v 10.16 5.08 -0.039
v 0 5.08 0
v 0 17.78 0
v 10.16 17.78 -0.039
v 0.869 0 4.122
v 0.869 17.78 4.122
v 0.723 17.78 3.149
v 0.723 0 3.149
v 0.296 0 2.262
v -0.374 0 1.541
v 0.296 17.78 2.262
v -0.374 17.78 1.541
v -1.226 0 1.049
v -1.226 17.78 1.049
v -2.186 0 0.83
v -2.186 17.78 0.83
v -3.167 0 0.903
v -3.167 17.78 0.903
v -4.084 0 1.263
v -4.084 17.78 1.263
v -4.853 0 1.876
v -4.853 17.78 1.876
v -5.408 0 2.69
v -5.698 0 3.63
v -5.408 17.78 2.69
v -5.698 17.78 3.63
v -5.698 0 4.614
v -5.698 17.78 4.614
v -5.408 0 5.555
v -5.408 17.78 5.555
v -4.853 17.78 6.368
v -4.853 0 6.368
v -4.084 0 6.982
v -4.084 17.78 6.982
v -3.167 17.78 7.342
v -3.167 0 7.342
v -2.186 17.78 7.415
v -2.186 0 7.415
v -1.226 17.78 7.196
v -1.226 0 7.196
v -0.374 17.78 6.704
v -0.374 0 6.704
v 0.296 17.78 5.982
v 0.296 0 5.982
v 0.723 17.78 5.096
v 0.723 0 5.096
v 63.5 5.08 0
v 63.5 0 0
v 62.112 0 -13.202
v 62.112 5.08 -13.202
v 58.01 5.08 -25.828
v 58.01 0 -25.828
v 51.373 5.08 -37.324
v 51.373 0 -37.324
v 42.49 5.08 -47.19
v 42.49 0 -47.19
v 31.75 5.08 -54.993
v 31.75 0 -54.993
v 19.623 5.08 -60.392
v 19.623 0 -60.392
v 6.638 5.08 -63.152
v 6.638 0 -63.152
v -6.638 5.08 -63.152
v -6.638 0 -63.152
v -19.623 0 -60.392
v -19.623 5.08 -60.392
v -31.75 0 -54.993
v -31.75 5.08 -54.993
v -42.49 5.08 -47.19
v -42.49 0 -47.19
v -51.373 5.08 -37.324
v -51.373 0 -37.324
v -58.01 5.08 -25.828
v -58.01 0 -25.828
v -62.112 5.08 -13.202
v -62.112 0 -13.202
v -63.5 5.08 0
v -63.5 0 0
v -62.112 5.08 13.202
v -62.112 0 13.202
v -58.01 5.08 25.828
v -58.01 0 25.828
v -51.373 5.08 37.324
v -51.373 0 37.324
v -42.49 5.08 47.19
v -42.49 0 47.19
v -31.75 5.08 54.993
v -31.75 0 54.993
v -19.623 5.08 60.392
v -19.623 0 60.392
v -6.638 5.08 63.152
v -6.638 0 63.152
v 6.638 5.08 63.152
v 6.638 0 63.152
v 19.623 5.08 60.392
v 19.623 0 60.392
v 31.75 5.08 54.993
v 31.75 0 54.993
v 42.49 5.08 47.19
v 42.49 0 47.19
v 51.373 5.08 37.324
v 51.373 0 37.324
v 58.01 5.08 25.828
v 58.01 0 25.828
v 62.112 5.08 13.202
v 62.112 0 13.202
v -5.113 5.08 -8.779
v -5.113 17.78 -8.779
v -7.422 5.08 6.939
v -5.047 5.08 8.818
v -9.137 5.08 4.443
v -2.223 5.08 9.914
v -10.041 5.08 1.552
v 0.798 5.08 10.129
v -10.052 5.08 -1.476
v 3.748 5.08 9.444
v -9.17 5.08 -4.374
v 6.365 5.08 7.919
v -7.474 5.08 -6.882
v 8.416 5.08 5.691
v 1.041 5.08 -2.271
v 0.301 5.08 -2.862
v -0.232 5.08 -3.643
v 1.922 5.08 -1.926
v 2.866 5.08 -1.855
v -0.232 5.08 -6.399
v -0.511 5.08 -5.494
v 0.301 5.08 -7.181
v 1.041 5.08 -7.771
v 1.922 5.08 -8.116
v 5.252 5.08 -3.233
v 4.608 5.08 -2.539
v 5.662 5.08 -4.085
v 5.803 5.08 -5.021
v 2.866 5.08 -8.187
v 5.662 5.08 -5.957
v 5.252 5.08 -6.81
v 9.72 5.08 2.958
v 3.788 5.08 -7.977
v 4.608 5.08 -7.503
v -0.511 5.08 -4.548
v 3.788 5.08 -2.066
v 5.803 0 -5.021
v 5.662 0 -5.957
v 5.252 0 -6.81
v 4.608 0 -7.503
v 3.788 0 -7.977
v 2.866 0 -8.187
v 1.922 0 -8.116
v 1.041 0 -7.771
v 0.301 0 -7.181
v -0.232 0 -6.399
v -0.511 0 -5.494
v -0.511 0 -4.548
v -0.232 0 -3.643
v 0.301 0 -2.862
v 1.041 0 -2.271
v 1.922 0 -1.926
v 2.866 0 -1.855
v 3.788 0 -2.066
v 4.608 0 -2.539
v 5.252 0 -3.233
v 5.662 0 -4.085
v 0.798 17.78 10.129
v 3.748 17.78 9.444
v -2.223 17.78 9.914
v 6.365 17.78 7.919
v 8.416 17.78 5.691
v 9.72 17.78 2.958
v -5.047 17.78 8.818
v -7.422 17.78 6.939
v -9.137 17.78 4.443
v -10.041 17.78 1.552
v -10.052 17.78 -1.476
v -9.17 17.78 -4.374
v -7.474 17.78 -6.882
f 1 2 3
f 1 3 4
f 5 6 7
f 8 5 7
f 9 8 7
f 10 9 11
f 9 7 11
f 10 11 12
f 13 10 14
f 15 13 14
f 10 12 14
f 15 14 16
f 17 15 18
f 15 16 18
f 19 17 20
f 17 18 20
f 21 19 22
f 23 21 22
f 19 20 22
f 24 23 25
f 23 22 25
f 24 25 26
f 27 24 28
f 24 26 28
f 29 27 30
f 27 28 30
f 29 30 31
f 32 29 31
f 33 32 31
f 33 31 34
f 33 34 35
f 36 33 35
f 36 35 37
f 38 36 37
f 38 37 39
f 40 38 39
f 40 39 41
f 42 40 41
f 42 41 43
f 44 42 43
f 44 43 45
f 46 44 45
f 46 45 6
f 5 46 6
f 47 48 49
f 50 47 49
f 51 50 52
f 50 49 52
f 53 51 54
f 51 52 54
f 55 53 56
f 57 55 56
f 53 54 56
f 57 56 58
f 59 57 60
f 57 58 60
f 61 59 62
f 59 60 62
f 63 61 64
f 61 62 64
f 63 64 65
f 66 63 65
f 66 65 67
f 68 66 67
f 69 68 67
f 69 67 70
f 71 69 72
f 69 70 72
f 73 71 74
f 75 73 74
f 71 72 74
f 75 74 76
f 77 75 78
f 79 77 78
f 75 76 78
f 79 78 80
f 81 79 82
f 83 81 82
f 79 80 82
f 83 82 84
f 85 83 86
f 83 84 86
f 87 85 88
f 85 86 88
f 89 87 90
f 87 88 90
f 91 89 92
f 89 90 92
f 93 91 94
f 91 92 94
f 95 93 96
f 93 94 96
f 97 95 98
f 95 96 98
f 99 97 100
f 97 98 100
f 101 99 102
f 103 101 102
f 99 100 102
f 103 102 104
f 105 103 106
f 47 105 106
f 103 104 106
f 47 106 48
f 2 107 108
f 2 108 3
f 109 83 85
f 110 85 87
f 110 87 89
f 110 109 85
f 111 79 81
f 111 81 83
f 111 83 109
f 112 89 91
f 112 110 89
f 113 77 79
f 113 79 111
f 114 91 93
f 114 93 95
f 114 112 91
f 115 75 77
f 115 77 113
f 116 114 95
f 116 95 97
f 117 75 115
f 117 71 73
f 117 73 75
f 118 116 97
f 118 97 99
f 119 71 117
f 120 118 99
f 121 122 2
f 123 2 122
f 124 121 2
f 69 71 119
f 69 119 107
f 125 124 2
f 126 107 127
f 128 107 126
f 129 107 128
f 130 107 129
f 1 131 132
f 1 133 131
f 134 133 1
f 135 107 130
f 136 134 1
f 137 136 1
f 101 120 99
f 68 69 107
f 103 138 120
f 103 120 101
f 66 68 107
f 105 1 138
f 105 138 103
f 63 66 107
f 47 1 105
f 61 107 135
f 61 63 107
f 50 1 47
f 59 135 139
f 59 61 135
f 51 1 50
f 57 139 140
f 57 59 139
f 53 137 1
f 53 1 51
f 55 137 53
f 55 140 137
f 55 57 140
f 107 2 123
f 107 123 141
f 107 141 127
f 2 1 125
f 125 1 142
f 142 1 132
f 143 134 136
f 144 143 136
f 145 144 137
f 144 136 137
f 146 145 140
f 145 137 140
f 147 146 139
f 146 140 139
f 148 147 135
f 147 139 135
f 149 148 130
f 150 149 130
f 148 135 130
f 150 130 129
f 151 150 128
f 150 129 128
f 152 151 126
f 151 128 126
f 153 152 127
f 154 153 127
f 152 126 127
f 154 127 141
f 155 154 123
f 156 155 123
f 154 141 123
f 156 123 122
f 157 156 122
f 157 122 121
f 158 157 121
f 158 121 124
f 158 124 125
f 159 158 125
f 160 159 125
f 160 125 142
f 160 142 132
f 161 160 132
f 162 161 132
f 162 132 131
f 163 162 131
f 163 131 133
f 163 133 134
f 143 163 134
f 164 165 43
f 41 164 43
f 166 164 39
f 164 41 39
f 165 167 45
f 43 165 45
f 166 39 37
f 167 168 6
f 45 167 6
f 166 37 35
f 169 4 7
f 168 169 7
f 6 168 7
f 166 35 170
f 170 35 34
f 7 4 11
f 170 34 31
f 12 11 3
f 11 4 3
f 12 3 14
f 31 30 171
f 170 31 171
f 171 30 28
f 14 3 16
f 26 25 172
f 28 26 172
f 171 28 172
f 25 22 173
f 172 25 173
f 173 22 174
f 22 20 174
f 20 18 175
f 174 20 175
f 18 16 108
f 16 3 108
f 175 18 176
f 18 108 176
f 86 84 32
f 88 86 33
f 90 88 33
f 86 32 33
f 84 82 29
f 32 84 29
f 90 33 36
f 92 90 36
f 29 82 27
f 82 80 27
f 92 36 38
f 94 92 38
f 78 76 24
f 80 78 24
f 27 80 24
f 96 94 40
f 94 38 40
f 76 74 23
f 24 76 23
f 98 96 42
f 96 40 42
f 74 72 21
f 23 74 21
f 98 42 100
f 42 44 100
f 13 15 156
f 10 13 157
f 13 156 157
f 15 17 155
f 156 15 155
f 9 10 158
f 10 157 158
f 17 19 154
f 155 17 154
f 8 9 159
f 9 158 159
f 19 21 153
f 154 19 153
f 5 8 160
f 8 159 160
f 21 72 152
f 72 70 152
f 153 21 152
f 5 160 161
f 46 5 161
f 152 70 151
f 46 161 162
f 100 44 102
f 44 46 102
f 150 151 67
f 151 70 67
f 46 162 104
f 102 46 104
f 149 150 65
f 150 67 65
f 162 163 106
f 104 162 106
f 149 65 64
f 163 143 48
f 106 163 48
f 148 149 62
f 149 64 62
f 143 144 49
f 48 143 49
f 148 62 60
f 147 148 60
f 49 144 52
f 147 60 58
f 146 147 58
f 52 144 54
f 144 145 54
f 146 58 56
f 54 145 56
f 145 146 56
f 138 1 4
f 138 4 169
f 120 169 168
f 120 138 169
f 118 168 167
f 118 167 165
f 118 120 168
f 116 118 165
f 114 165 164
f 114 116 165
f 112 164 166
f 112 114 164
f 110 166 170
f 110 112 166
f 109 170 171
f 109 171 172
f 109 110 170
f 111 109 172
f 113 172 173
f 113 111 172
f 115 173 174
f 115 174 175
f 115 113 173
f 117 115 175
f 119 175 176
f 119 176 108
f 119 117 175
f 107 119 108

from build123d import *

# Parameters (mm, degrees)
SKETCH1_R           = 63.5
BOSS_EXTRUDE1_DEPTH = 5.08
BOSS_EXTRUDE2_DEPTH = 12.7
SKETCH5_R           = 3.175
CUT_EXTRUDE1_DEPTH  = 6.08
SKETCH6_R           = 3.302
CUT_EXTRUDE2_DEPTH  = 18.78


with BuildPart() as part:
    # Sketch1 → Boss-Extrude1 (new body)
    with BuildSketch(Plane(origin=(0, 0, 0), x_dir=(1, 0, 0), z_dir=(0, 1, 0))):
        Circle(SKETCH1_R)
    extrude(amount=BOSS_EXTRUDE1_DEPTH)

    # Sketch2 → Boss-Extrude2 (add)
    with BuildSketch(Plane(origin=(0, 5.08, 0), x_dir=(1, 0, 0), z_dir=(0, 1, 0))):
        with BuildLine():
            Line((-5.113329796, 8.779490782), (0, 0))
            Line((0, 0), (10.159926948, 0.03852811))
            ThreePointArc((10.159926948, 0.03852811), (-5.046597152, -8.818018893), (-5.113329796, 8.779490782))
        make_face()
    extrude(amount=BOSS_EXTRUDE2_DEPTH)

    # Sketch5 → Cut-Extrude1 (cut, through all)
    with BuildSketch(Plane(origin=(0, 5.08, 0), x_dir=(1, 0, 0), z_dir=(0, 1, 0))):
        with Locations((2.628439651, 5.021053822)):
            Circle(SKETCH5_R)
    extrude(amount=-CUT_EXTRUDE1_DEPTH, mode=Mode.SUBTRACT)

    # Sketch6 → Cut-Extrude2 (cut, through all)
    with BuildSketch(Plane(origin=(0, 17.78, 0), x_dir=(1, 0, 0), z_dir=(0, 1, 0))):
        with Locations((-2.432656569, -4.122340405)):
            Circle(SKETCH6_R)
    extrude(amount=-CUT_EXTRUDE2_DEPTH, mode=Mode.SUBTRACT)


solid = part.part
